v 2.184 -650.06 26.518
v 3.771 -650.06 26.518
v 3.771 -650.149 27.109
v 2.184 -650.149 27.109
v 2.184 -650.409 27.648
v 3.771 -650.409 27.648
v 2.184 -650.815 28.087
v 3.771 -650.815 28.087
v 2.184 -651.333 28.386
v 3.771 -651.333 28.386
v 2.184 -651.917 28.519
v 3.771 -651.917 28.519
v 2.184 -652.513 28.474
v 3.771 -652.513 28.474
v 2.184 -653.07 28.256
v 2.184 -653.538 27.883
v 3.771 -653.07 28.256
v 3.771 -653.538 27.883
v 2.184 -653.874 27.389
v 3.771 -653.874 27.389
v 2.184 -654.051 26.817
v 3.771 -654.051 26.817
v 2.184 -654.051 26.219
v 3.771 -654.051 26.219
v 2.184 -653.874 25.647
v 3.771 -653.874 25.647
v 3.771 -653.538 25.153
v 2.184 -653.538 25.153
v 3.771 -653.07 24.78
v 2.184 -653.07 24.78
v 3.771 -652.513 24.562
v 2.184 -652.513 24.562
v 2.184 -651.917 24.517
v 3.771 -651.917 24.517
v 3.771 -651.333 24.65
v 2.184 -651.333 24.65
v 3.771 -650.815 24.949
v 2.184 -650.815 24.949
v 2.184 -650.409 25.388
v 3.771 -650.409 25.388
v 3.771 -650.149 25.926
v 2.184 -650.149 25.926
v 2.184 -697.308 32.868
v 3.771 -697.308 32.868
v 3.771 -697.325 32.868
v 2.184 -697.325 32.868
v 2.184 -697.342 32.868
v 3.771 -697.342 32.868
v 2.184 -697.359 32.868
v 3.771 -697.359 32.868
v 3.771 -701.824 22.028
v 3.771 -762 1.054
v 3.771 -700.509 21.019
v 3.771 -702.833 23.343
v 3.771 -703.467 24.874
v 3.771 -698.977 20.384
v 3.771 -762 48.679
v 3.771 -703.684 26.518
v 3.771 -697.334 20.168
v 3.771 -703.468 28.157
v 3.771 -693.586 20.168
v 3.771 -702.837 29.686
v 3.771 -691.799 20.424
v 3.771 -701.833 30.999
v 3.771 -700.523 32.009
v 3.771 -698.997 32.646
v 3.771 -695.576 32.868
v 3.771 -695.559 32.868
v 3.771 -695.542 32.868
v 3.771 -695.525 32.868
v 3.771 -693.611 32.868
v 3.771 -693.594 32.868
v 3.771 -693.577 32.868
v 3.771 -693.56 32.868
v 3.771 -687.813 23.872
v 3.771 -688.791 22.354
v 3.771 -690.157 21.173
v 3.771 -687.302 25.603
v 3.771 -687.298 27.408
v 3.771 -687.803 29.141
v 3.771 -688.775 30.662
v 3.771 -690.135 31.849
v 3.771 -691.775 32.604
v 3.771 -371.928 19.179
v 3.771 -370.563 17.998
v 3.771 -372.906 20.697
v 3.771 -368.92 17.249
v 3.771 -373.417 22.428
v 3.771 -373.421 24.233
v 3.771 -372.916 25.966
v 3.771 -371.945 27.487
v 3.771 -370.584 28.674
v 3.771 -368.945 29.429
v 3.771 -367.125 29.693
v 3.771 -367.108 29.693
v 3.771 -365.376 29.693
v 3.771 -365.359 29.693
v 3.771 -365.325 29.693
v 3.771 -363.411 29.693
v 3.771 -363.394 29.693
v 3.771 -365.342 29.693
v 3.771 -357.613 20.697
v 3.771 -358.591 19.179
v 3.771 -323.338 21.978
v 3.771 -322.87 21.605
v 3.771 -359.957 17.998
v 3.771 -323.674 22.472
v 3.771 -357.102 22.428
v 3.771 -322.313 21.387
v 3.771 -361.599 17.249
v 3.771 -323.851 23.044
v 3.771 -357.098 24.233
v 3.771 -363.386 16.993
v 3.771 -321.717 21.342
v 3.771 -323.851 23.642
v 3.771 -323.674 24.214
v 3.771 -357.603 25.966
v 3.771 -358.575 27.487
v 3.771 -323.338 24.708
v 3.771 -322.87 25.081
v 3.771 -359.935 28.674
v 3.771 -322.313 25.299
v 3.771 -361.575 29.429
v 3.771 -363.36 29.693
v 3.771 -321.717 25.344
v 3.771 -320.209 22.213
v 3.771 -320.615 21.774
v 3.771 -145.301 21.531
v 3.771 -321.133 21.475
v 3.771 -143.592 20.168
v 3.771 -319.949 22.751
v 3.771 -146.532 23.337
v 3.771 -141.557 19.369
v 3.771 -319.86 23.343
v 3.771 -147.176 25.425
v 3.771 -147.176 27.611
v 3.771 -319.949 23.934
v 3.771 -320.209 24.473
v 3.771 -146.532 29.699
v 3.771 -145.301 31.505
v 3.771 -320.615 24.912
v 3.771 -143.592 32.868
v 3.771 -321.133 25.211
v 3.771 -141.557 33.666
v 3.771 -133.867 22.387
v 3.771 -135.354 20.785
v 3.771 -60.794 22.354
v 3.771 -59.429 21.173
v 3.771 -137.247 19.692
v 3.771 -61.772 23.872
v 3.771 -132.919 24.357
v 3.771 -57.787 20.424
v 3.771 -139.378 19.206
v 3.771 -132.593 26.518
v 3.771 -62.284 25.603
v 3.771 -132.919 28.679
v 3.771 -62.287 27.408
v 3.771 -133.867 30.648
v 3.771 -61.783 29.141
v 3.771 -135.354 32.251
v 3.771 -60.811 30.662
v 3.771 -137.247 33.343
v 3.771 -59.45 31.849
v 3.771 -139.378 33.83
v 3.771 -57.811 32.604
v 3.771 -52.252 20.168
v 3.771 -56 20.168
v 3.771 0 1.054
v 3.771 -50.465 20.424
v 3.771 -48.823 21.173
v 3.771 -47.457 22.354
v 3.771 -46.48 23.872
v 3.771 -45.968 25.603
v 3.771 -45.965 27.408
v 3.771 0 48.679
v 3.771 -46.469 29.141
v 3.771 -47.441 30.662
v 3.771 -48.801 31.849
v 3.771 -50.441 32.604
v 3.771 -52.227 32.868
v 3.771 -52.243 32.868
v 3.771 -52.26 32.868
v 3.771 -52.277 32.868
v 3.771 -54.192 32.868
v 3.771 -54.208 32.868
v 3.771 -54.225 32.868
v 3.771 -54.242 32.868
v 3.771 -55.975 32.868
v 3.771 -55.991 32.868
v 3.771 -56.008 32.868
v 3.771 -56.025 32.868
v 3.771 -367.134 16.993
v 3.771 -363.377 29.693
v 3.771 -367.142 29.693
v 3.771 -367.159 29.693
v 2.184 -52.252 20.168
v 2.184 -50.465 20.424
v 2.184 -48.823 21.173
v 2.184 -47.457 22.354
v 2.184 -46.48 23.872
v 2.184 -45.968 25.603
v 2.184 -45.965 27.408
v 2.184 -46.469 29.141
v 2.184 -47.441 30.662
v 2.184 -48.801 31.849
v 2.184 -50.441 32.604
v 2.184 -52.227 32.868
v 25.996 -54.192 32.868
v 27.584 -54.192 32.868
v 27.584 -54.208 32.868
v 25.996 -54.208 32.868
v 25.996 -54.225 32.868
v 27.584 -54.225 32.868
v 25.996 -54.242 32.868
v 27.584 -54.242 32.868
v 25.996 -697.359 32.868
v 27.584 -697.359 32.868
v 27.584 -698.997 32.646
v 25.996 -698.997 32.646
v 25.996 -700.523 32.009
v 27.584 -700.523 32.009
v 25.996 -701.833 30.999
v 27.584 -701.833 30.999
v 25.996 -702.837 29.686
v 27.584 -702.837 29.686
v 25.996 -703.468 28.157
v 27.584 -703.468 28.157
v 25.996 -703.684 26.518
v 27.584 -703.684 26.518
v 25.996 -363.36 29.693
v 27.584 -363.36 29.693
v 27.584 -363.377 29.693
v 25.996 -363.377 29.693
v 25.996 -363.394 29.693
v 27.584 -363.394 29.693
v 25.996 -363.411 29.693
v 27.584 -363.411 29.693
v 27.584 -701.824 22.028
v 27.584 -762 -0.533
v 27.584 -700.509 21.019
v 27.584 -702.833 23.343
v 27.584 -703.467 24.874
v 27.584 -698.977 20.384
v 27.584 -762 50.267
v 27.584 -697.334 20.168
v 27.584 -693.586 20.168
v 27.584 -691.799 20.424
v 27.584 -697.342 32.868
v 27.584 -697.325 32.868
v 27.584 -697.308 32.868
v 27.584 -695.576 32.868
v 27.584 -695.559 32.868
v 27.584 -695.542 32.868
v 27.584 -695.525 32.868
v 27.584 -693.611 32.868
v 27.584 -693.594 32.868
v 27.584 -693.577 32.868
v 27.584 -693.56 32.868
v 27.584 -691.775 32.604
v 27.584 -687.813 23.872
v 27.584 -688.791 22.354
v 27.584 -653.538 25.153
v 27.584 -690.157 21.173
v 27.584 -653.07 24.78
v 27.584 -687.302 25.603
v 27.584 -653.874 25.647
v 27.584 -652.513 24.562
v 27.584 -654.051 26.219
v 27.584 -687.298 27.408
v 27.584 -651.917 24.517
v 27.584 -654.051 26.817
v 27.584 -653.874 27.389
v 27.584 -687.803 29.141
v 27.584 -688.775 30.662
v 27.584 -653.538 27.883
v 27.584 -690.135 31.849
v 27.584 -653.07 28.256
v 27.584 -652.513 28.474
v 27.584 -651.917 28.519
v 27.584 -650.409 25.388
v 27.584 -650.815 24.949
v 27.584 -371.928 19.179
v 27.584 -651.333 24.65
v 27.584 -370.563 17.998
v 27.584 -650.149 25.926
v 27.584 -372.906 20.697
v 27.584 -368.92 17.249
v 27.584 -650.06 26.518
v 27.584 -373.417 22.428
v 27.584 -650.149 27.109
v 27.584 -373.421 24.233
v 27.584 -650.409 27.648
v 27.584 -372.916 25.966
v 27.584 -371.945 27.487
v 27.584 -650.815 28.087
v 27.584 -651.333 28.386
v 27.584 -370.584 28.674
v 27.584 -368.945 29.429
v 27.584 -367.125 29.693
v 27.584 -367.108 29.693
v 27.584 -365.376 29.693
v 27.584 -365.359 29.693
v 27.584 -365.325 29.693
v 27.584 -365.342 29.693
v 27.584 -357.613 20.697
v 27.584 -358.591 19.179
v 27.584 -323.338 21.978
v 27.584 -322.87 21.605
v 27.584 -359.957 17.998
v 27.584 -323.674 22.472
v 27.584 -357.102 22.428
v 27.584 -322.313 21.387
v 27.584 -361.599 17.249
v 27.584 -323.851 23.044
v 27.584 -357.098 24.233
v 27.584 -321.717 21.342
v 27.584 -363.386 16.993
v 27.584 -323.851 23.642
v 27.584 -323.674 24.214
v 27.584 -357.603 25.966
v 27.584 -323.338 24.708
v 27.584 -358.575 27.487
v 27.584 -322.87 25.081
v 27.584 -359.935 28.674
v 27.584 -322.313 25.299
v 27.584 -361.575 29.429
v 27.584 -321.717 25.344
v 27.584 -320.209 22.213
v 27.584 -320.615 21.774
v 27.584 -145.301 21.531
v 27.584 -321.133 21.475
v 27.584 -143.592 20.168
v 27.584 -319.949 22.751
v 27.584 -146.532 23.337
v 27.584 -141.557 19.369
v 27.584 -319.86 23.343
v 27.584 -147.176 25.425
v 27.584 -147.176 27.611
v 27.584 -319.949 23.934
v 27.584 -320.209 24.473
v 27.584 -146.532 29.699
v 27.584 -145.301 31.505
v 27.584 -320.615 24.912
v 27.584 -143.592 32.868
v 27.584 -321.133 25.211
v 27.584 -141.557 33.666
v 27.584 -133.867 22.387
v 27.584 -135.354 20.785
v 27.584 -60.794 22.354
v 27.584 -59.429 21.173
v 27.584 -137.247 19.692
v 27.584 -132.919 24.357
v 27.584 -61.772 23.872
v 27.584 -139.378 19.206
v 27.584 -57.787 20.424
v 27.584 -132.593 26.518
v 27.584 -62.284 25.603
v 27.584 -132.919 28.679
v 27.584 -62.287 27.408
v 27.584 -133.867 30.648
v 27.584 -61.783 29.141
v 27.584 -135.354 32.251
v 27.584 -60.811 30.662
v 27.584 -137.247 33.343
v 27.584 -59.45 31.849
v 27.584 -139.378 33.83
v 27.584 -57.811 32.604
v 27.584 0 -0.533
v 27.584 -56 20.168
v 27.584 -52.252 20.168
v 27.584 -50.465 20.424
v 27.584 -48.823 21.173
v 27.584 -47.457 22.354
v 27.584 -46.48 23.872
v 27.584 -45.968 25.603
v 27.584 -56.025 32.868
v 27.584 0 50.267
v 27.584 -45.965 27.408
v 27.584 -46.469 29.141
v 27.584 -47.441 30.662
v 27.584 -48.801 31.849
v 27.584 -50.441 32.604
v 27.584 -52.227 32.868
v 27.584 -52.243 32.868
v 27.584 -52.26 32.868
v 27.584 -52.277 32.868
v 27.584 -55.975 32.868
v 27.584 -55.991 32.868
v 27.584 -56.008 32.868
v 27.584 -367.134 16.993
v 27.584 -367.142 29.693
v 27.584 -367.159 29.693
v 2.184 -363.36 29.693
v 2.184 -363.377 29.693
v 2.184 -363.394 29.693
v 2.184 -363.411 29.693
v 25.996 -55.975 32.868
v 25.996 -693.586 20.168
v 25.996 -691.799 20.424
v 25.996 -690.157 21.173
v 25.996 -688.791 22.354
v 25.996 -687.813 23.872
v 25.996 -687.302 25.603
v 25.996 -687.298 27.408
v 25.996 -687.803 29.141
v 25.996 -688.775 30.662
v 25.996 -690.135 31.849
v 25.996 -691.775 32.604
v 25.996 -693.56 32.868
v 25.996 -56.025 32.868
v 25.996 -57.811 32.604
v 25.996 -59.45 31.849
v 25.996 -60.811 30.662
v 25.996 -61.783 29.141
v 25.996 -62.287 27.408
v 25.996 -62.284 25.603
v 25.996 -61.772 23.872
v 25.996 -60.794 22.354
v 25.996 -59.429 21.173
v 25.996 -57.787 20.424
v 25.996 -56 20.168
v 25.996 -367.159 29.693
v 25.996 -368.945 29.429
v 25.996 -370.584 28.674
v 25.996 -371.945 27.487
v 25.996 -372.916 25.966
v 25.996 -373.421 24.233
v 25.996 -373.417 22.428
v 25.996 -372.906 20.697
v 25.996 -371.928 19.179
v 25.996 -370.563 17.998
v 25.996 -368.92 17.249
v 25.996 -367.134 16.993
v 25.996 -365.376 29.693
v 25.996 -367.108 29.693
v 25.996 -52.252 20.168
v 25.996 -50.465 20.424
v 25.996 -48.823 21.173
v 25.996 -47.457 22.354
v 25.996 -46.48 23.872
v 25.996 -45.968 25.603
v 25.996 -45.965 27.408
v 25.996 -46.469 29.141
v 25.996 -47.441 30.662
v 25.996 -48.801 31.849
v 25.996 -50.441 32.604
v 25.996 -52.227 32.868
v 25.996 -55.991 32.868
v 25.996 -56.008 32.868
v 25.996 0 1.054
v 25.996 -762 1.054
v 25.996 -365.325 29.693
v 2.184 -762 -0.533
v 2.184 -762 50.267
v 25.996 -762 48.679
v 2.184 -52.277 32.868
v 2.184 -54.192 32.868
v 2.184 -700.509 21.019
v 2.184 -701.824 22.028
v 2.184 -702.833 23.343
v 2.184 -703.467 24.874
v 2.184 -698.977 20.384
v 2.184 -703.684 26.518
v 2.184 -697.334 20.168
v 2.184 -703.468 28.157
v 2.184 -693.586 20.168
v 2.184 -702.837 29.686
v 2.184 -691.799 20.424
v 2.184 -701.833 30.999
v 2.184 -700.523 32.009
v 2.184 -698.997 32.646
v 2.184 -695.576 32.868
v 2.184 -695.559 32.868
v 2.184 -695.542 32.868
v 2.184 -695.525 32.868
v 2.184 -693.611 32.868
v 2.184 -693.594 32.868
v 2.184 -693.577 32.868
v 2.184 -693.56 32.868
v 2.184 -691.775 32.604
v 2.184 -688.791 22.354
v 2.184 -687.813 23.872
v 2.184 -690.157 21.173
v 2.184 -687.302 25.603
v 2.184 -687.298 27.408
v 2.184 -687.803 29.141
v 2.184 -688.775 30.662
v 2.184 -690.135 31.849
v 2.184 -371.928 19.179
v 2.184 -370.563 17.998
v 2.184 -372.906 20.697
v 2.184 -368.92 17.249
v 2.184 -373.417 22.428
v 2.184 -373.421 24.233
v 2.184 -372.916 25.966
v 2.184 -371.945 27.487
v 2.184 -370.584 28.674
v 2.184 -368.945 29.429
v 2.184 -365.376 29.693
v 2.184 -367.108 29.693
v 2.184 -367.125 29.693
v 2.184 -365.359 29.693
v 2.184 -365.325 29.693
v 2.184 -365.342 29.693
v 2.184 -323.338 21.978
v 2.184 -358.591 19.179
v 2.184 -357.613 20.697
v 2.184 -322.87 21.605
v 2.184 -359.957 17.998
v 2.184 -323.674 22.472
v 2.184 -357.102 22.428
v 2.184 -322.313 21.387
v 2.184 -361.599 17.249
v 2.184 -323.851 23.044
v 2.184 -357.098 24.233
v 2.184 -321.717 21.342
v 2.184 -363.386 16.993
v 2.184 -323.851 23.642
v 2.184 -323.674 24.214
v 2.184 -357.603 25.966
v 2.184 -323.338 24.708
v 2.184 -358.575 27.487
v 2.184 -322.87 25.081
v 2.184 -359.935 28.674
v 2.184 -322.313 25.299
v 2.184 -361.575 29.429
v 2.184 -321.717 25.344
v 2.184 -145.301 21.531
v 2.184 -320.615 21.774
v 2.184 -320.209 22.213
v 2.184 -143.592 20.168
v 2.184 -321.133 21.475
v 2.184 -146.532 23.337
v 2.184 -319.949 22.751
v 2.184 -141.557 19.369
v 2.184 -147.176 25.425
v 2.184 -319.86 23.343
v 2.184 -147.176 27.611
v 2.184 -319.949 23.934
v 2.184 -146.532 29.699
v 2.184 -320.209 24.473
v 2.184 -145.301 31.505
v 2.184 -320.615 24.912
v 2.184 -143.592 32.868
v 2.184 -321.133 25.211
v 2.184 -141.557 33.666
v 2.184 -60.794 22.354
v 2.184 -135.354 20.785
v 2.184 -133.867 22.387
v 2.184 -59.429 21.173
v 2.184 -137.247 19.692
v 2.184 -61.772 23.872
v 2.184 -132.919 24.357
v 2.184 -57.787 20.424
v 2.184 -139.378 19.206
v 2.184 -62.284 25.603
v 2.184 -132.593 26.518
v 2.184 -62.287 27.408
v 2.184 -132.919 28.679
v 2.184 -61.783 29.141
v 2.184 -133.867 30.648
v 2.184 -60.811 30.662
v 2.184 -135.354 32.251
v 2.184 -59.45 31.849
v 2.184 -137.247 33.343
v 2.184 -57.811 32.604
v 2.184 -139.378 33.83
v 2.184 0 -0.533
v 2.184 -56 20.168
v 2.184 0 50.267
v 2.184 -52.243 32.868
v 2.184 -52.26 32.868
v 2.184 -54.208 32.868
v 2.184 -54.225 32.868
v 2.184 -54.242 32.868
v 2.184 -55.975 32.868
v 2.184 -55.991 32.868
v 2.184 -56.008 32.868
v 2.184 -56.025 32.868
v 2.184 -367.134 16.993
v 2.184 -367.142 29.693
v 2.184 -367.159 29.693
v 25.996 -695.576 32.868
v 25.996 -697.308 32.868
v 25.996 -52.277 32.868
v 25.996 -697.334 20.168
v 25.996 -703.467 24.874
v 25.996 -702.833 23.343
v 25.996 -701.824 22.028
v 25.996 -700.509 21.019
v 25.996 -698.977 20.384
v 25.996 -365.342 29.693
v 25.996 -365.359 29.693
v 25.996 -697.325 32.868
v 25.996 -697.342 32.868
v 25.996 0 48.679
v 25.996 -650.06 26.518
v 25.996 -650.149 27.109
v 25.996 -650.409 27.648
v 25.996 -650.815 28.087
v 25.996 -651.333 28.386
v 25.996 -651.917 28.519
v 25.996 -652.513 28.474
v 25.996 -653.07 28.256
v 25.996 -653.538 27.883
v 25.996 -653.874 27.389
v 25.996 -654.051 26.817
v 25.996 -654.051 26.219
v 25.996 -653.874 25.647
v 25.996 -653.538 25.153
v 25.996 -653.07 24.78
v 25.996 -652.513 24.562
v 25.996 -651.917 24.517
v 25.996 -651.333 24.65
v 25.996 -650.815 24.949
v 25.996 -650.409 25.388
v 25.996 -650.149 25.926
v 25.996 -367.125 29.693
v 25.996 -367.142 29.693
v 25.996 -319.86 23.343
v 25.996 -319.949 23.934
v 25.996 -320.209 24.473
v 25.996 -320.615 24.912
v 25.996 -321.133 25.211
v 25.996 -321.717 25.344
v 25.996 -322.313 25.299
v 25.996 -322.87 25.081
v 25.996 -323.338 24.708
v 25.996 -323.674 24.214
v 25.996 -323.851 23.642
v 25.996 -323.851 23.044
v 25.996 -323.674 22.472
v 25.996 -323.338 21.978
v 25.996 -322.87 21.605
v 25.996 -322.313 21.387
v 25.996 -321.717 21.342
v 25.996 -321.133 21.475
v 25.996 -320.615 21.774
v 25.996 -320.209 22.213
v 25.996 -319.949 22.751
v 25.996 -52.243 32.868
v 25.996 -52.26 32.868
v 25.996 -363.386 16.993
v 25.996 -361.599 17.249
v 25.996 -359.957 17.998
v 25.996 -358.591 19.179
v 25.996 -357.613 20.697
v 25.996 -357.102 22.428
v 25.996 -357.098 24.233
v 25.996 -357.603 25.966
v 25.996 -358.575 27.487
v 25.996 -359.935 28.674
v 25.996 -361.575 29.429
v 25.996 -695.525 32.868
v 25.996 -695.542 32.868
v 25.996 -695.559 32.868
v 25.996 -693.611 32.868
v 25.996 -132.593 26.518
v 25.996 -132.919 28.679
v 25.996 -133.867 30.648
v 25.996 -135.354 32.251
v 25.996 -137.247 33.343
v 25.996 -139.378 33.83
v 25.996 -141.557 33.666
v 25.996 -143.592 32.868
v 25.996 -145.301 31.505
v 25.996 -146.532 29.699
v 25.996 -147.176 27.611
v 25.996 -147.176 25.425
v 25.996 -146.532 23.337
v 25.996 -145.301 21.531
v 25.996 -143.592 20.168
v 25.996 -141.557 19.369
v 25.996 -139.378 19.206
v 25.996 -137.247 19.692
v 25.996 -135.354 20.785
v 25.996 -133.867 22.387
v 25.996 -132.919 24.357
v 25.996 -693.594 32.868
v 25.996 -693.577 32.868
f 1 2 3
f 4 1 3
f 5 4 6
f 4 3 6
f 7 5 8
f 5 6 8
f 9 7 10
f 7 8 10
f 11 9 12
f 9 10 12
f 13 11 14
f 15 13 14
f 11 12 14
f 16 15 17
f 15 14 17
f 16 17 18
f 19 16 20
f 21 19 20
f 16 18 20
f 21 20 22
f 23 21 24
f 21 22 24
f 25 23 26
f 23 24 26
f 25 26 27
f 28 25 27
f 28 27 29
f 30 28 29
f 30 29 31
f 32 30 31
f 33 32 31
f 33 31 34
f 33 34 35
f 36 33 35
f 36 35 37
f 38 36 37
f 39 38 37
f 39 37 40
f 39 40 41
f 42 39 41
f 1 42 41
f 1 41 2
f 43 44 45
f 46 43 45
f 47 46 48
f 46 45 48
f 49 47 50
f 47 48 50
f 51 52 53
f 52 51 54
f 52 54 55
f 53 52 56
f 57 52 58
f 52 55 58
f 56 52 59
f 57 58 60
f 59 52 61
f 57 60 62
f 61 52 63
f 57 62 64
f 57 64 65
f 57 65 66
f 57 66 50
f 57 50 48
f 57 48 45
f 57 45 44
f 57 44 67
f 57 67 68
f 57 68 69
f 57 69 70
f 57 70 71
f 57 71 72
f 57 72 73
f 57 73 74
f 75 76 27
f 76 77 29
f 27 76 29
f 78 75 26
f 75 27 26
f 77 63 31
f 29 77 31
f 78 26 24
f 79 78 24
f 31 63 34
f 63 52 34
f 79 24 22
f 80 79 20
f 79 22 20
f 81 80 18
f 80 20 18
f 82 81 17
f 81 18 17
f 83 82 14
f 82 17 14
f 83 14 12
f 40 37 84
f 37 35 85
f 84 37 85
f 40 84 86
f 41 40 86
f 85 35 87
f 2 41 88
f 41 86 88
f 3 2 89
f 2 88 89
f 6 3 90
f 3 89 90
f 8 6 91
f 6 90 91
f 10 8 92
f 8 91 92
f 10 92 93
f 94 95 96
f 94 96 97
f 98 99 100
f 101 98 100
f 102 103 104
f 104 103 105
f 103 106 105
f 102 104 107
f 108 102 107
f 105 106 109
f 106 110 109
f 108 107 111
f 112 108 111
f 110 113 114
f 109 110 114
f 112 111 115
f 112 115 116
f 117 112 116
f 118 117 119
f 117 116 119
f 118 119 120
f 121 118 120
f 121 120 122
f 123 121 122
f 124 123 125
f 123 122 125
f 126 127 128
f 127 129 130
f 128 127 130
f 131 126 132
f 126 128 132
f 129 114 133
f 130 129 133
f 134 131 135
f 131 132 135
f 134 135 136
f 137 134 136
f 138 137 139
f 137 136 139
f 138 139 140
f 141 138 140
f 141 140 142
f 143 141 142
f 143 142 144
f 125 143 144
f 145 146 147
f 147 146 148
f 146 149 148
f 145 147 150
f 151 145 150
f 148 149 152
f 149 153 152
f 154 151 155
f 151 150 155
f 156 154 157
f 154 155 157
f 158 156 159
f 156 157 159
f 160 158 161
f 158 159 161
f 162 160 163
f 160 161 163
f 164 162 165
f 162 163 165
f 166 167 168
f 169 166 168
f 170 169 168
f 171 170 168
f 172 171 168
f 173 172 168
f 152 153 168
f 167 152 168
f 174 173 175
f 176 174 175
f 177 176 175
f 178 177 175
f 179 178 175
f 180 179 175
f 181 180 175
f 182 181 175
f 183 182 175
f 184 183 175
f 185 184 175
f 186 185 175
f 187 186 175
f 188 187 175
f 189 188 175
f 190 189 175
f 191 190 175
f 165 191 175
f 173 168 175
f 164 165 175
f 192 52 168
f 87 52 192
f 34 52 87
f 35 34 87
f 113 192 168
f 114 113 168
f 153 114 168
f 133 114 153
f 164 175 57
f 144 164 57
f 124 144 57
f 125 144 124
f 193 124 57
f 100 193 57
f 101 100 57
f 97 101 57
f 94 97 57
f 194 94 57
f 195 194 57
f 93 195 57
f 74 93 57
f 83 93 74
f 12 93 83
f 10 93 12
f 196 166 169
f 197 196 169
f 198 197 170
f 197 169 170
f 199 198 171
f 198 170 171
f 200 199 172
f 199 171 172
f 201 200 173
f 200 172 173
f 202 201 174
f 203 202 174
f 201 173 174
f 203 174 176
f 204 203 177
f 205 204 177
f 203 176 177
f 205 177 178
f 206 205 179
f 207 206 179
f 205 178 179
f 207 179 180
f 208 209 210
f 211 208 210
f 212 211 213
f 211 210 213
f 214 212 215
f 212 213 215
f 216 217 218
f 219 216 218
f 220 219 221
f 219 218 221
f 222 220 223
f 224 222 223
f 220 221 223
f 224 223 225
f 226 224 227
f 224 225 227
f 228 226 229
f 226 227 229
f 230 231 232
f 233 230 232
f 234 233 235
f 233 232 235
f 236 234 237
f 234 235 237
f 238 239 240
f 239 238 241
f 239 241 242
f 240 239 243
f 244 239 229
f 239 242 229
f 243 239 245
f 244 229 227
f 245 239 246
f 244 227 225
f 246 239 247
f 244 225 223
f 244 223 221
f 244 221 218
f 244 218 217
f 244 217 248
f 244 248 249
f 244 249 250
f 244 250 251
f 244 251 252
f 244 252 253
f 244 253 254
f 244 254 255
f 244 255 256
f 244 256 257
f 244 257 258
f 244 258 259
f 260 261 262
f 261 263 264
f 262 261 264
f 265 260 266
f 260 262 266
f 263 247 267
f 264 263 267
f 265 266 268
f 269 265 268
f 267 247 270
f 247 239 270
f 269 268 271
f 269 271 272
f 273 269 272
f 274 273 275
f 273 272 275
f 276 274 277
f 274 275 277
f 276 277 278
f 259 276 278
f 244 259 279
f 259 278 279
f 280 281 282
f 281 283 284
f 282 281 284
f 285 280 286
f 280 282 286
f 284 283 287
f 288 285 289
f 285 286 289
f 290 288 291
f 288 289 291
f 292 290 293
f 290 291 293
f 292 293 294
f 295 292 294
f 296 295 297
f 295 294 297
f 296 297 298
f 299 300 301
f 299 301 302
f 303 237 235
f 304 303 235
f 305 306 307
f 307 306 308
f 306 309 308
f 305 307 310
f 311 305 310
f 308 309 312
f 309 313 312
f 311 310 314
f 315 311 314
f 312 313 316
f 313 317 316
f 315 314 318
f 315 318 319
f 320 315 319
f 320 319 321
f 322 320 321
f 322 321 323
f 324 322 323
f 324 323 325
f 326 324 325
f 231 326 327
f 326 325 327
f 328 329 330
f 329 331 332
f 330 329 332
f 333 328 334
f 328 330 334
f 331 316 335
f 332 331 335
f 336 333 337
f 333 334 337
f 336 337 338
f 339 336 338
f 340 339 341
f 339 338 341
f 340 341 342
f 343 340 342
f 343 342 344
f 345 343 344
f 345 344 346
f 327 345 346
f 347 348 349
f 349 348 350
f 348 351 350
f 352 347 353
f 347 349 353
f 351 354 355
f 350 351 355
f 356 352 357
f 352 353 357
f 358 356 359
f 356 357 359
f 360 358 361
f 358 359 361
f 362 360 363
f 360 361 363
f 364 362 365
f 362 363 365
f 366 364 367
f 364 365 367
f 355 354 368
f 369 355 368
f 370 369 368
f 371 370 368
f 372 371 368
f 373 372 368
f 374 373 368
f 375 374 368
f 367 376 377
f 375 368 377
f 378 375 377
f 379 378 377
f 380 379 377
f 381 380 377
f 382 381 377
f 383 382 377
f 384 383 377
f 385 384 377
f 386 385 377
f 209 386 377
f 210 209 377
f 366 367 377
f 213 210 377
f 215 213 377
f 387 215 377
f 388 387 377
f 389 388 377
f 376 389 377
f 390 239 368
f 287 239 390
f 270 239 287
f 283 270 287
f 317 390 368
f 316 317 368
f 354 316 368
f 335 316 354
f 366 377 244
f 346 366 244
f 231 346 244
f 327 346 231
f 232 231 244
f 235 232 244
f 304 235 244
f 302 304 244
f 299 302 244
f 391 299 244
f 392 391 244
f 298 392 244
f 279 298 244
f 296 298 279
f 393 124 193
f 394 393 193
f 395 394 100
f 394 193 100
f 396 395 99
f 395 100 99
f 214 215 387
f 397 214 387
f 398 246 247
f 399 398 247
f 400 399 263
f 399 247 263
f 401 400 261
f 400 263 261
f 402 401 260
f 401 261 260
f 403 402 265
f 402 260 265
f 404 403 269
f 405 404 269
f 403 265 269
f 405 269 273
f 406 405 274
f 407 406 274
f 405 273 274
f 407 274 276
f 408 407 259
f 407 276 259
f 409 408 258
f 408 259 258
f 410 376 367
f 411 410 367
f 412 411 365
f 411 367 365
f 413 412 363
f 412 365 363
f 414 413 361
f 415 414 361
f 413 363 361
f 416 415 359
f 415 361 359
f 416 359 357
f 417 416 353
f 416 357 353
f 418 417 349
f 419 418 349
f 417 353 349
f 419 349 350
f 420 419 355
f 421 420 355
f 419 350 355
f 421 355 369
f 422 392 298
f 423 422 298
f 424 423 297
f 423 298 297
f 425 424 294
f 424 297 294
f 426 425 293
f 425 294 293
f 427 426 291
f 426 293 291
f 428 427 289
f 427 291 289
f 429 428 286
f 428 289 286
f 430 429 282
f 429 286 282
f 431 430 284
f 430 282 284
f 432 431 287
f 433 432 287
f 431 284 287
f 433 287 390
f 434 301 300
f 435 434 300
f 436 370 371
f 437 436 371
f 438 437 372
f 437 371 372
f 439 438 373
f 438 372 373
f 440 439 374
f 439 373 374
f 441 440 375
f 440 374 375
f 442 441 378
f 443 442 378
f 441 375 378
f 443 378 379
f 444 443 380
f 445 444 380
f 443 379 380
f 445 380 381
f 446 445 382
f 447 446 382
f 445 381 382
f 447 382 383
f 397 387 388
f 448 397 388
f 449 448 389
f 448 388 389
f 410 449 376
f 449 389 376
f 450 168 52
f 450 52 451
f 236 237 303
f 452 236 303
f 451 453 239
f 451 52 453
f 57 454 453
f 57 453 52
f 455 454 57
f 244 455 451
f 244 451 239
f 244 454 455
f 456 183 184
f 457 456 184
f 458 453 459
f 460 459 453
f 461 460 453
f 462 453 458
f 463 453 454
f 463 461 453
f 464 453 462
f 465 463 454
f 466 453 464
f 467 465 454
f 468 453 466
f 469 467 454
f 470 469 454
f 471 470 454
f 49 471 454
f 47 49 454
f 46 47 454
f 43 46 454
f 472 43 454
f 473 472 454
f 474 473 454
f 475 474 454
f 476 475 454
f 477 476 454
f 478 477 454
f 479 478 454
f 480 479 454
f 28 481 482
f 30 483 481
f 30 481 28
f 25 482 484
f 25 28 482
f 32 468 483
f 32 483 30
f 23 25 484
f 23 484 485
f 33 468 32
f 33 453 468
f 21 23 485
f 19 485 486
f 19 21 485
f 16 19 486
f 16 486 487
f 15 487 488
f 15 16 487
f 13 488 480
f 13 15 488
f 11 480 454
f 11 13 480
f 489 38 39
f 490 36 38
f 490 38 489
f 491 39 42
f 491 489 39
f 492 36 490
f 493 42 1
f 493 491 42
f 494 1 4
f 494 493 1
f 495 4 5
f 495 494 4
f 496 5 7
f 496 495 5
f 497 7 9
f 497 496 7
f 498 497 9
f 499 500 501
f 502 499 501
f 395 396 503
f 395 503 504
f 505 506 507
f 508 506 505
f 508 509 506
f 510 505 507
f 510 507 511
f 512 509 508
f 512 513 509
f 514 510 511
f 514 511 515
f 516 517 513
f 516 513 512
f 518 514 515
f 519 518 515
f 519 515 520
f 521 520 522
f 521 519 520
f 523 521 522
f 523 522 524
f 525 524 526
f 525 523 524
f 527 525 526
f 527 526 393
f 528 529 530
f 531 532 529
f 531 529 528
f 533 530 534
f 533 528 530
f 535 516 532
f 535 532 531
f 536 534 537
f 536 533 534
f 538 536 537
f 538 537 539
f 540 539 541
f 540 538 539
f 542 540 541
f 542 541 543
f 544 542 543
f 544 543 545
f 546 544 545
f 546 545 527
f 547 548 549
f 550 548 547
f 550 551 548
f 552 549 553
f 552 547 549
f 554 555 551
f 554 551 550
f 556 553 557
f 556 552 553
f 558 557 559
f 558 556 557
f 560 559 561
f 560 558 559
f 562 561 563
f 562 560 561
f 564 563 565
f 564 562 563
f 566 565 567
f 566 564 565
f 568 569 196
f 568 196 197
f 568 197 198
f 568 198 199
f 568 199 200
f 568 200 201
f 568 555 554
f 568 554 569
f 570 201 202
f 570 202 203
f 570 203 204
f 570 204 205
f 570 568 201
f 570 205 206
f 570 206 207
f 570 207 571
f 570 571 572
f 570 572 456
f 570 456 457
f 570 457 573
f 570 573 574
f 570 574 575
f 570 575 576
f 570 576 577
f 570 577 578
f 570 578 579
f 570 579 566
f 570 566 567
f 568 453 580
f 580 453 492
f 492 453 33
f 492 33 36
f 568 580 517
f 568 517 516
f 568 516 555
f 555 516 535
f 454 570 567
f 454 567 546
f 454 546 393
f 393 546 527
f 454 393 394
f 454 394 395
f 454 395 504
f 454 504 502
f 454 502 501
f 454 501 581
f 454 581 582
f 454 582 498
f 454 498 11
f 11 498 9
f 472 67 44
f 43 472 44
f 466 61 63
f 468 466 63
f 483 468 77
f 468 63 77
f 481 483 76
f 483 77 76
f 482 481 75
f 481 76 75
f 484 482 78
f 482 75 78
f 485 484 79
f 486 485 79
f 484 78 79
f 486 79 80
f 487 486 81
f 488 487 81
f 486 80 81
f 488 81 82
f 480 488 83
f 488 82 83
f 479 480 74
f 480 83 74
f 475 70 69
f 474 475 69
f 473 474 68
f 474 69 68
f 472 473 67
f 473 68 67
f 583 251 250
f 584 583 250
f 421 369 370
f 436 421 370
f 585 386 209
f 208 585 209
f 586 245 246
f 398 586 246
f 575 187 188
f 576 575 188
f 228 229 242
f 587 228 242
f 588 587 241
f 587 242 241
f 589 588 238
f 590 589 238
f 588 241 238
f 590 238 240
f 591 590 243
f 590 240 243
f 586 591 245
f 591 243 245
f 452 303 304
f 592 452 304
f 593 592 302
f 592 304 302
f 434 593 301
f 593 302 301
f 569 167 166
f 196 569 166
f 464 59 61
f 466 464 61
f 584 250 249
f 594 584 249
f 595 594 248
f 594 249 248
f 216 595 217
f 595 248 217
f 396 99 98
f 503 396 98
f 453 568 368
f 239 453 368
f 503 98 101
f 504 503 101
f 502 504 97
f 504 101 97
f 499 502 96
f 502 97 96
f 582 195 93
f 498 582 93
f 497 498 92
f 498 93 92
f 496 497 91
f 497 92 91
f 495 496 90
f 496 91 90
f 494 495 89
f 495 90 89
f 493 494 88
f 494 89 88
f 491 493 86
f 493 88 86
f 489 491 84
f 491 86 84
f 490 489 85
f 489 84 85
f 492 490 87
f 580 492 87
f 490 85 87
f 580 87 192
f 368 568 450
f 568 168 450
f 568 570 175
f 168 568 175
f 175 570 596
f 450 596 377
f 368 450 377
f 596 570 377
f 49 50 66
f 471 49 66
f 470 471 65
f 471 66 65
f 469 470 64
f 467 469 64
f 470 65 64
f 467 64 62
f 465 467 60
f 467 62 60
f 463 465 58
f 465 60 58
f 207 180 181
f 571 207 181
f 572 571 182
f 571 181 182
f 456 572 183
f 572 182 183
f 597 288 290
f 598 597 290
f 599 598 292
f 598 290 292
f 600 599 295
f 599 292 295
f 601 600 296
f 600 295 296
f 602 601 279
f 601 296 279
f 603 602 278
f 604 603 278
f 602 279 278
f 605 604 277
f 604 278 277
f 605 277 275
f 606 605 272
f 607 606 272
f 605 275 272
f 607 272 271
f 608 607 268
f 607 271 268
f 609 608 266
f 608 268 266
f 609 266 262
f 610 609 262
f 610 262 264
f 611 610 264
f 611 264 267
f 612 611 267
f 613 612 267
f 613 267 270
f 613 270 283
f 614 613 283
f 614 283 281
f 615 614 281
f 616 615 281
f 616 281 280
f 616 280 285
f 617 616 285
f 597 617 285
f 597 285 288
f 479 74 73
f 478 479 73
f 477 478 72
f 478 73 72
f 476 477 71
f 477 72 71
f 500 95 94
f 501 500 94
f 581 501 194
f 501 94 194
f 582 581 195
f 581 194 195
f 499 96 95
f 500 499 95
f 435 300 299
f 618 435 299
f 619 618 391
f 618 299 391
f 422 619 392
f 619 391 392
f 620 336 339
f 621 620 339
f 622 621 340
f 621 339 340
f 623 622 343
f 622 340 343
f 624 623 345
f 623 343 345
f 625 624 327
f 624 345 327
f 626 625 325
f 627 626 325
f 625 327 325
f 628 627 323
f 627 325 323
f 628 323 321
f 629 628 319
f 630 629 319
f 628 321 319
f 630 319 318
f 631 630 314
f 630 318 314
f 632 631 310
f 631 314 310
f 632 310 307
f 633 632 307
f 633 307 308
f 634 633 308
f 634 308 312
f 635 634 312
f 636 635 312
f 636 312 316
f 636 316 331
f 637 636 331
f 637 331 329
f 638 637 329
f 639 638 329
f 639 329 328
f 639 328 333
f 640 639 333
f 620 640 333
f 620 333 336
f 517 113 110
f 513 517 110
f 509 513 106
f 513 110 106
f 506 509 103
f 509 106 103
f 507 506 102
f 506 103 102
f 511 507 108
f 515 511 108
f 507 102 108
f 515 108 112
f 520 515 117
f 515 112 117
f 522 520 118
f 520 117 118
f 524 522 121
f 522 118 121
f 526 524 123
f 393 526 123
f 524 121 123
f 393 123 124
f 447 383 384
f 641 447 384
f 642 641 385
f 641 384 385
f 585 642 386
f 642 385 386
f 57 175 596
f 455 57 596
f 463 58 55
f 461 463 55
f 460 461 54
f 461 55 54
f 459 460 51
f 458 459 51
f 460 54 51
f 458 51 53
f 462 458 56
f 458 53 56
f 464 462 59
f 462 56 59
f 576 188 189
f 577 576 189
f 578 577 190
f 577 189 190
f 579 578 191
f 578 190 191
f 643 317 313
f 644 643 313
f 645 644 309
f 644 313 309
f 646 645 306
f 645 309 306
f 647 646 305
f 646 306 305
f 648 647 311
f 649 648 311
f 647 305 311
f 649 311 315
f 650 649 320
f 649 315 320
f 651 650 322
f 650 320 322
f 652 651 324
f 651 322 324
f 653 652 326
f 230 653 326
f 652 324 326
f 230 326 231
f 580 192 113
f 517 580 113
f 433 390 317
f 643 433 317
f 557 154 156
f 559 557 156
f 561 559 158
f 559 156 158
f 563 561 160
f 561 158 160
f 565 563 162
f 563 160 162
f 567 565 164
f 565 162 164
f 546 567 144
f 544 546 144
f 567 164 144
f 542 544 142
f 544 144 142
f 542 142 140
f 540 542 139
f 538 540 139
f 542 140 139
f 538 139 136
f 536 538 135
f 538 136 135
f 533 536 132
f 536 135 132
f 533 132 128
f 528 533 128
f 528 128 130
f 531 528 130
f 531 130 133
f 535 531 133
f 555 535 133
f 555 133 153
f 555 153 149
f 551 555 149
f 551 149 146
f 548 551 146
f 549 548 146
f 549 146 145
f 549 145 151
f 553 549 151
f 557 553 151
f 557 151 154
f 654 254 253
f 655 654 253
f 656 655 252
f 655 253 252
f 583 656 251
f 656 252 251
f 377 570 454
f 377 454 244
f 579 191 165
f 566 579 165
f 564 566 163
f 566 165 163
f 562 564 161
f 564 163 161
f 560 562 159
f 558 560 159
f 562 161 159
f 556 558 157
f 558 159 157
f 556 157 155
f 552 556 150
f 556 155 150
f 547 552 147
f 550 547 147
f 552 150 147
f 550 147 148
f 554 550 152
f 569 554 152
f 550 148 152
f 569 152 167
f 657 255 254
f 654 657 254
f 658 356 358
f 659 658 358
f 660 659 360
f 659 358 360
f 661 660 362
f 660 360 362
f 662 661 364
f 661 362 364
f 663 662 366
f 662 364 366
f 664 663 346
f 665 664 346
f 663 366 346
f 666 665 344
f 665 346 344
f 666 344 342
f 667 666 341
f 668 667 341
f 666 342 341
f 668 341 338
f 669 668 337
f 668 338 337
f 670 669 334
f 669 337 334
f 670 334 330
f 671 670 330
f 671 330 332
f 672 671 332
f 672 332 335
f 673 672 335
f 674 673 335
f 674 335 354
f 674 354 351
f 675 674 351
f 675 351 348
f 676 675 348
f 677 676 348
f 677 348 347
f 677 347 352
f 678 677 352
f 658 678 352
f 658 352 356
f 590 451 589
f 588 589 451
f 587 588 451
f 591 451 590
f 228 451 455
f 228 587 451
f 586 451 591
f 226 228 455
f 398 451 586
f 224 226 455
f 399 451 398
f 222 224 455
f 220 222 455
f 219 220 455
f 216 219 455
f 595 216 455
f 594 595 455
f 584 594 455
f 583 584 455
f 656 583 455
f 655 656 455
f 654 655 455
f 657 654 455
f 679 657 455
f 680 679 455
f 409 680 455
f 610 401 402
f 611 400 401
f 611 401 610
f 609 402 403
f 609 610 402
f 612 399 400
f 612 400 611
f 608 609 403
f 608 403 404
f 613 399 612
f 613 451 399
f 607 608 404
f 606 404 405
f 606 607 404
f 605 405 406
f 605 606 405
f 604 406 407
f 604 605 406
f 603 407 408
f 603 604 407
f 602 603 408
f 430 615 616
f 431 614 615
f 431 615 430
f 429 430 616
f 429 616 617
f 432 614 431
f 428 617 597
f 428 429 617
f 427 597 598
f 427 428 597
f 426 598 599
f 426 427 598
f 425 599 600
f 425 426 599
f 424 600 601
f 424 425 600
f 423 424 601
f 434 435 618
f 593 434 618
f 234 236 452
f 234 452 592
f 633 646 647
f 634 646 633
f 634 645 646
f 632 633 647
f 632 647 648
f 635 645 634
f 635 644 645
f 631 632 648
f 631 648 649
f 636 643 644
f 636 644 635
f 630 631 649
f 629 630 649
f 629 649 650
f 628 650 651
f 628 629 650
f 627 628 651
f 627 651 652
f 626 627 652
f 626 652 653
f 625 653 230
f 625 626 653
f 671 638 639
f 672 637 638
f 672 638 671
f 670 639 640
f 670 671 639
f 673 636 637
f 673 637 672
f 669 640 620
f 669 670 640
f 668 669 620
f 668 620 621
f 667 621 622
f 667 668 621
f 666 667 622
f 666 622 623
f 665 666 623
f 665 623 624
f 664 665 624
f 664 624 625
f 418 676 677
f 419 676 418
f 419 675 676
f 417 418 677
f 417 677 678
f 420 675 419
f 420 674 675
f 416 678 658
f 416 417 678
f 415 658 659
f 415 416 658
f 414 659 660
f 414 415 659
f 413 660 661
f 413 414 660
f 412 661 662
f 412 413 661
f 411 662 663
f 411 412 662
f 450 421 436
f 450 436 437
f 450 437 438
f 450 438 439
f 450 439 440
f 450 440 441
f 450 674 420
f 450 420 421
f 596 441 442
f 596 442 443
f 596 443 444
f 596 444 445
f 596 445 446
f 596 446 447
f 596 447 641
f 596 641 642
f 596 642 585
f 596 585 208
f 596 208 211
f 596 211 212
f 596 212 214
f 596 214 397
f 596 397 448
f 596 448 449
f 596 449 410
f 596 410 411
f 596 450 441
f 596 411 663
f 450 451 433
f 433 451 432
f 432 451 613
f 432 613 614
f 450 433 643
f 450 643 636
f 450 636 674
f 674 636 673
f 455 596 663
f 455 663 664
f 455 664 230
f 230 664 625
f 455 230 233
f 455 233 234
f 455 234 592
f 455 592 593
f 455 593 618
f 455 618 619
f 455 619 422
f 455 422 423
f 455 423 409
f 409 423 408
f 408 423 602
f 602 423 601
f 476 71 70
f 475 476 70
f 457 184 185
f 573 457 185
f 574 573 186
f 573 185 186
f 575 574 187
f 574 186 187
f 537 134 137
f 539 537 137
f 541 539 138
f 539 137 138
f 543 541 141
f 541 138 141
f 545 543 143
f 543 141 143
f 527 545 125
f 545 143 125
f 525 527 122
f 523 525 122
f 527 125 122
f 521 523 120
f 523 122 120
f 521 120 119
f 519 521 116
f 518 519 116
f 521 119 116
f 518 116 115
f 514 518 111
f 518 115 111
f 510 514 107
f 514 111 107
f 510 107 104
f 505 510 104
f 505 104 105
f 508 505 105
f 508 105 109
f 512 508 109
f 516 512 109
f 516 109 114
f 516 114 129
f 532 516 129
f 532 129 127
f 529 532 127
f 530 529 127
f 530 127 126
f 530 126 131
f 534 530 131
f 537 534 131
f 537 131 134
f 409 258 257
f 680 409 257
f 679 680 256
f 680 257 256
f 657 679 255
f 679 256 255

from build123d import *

# Parameters (mm, degrees)
F0_W     = 25.4
F0_H     = 50.8
F0_W_2   = 22.225
F0_H_2   = 47.625
F1_DEPTH = 762
F2_R     = 2.0066
F2_R_2   = 7.332348
F3_DEPTH = 25.401


with BuildPart() as f1:
    # F0 (on Front) → F1 (new body)
    with BuildSketch(Plane.XZ):
        with Locations((14.883514, 24.866902)):
            Rectangle(F0_W, F0_H)
        with Locations((14.883514, 24.866902)):
            Rectangle(F0_W_2, F0_H_2, mode=Mode.SUBTRACT)
    extrude(amount=F1_DEPTH)

    # F2 (on face) → F3 (cut, through all)
    with BuildSketch(Plane.YZ.offset(27.583514)):
        with BuildLine():
            Line((-697.333634, 20.167902), (-693.585719, 20.167902))
            ThreePointArc((-693.585719, 20.167902), (-687.235732, 26.505267), (-693.560449, 32.867852))
            ThreePointArc((-693.560449, 32.867852), (-693.585719, 32.867902), (-693.61099, 32.867852))
            Line((-693.61099, 32.867852), (-695.525434, 32.867852))
            ThreePointArc((-695.525434, 32.867852), (-695.550704, 32.867902), (-695.575975, 32.867852))
            Line((-695.575975, 32.867852), (-697.308364, 32.867852))
            ThreePointArc((-697.308364, 32.867852), (-697.333634, 32.867902), (-697.358904, 32.867852))
            ThreePointArc((-697.358904, 32.867852), (-701.832688, 30.999087), (-703.683634, 26.517902))
            ThreePointArc((-703.683634, 26.517902), (-701.823762, 22.027774), (-697.333634, 20.167902))
        make_face()
        with BuildLine():
            Line((-367.133634, 16.992902), (-363.385719, 16.992902))
            ThreePointArc((-363.385719, 16.992902), (-357.035732, 23.330267), (-363.360449, 29.692852))
            ThreePointArc((-363.360449, 29.692852), (-363.385719, 29.692902), (-363.41099, 29.692852))
            Line((-363.41099, 29.692852), (-365.325434, 29.692852))
            ThreePointArc((-365.325434, 29.692852), (-365.350704, 29.692902), (-365.375975, 29.692852))
            Line((-365.375975, 29.692852), (-367.108364, 29.692852))
            ThreePointArc((-367.108364, 29.692852), (-367.133634, 29.692902), (-367.158904, 29.692852))
            ThreePointArc((-367.158904, 29.692852), (-373.483621, 23.330267), (-367.133634, 16.992902))
        make_face()
        with BuildLine():
            Line((-55.999833, 20.167902), (-52.251919, 20.167902))
            ThreePointArc((-52.251919, 20.167902), (-45.901931, 26.505267), (-52.226648, 32.867852))
            ThreePointArc((-52.226648, 32.867852), (-52.251919, 32.867902), (-52.277189, 32.867852))
            Line((-52.277189, 32.867852), (-54.191633, 32.867852))
            ThreePointArc((-54.191633, 32.867852), (-54.216904, 32.867902), (-54.242174, 32.867852))
            Line((-54.242174, 32.867852), (-55.974563, 32.867852))
            ThreePointArc((-55.974563, 32.867852), (-55.999833, 32.867902), (-56.025104, 32.867852))
            ThreePointArc((-56.025104, 32.867852), (-62.349821, 26.505267), (-55.999833, 20.167902))
        make_face()
        with Locations((-321.866565, 23.342902)):
            Circle(F2_R)
        with Locations((-652.066565, 26.517902)):
            Circle(F2_R)
        with Locations((-139.925704, 26.517902)):
            Circle(F2_R_2)
    extrude(amount=-F3_DEPTH, mode=Mode.SUBTRACT)


solid = f1.part
